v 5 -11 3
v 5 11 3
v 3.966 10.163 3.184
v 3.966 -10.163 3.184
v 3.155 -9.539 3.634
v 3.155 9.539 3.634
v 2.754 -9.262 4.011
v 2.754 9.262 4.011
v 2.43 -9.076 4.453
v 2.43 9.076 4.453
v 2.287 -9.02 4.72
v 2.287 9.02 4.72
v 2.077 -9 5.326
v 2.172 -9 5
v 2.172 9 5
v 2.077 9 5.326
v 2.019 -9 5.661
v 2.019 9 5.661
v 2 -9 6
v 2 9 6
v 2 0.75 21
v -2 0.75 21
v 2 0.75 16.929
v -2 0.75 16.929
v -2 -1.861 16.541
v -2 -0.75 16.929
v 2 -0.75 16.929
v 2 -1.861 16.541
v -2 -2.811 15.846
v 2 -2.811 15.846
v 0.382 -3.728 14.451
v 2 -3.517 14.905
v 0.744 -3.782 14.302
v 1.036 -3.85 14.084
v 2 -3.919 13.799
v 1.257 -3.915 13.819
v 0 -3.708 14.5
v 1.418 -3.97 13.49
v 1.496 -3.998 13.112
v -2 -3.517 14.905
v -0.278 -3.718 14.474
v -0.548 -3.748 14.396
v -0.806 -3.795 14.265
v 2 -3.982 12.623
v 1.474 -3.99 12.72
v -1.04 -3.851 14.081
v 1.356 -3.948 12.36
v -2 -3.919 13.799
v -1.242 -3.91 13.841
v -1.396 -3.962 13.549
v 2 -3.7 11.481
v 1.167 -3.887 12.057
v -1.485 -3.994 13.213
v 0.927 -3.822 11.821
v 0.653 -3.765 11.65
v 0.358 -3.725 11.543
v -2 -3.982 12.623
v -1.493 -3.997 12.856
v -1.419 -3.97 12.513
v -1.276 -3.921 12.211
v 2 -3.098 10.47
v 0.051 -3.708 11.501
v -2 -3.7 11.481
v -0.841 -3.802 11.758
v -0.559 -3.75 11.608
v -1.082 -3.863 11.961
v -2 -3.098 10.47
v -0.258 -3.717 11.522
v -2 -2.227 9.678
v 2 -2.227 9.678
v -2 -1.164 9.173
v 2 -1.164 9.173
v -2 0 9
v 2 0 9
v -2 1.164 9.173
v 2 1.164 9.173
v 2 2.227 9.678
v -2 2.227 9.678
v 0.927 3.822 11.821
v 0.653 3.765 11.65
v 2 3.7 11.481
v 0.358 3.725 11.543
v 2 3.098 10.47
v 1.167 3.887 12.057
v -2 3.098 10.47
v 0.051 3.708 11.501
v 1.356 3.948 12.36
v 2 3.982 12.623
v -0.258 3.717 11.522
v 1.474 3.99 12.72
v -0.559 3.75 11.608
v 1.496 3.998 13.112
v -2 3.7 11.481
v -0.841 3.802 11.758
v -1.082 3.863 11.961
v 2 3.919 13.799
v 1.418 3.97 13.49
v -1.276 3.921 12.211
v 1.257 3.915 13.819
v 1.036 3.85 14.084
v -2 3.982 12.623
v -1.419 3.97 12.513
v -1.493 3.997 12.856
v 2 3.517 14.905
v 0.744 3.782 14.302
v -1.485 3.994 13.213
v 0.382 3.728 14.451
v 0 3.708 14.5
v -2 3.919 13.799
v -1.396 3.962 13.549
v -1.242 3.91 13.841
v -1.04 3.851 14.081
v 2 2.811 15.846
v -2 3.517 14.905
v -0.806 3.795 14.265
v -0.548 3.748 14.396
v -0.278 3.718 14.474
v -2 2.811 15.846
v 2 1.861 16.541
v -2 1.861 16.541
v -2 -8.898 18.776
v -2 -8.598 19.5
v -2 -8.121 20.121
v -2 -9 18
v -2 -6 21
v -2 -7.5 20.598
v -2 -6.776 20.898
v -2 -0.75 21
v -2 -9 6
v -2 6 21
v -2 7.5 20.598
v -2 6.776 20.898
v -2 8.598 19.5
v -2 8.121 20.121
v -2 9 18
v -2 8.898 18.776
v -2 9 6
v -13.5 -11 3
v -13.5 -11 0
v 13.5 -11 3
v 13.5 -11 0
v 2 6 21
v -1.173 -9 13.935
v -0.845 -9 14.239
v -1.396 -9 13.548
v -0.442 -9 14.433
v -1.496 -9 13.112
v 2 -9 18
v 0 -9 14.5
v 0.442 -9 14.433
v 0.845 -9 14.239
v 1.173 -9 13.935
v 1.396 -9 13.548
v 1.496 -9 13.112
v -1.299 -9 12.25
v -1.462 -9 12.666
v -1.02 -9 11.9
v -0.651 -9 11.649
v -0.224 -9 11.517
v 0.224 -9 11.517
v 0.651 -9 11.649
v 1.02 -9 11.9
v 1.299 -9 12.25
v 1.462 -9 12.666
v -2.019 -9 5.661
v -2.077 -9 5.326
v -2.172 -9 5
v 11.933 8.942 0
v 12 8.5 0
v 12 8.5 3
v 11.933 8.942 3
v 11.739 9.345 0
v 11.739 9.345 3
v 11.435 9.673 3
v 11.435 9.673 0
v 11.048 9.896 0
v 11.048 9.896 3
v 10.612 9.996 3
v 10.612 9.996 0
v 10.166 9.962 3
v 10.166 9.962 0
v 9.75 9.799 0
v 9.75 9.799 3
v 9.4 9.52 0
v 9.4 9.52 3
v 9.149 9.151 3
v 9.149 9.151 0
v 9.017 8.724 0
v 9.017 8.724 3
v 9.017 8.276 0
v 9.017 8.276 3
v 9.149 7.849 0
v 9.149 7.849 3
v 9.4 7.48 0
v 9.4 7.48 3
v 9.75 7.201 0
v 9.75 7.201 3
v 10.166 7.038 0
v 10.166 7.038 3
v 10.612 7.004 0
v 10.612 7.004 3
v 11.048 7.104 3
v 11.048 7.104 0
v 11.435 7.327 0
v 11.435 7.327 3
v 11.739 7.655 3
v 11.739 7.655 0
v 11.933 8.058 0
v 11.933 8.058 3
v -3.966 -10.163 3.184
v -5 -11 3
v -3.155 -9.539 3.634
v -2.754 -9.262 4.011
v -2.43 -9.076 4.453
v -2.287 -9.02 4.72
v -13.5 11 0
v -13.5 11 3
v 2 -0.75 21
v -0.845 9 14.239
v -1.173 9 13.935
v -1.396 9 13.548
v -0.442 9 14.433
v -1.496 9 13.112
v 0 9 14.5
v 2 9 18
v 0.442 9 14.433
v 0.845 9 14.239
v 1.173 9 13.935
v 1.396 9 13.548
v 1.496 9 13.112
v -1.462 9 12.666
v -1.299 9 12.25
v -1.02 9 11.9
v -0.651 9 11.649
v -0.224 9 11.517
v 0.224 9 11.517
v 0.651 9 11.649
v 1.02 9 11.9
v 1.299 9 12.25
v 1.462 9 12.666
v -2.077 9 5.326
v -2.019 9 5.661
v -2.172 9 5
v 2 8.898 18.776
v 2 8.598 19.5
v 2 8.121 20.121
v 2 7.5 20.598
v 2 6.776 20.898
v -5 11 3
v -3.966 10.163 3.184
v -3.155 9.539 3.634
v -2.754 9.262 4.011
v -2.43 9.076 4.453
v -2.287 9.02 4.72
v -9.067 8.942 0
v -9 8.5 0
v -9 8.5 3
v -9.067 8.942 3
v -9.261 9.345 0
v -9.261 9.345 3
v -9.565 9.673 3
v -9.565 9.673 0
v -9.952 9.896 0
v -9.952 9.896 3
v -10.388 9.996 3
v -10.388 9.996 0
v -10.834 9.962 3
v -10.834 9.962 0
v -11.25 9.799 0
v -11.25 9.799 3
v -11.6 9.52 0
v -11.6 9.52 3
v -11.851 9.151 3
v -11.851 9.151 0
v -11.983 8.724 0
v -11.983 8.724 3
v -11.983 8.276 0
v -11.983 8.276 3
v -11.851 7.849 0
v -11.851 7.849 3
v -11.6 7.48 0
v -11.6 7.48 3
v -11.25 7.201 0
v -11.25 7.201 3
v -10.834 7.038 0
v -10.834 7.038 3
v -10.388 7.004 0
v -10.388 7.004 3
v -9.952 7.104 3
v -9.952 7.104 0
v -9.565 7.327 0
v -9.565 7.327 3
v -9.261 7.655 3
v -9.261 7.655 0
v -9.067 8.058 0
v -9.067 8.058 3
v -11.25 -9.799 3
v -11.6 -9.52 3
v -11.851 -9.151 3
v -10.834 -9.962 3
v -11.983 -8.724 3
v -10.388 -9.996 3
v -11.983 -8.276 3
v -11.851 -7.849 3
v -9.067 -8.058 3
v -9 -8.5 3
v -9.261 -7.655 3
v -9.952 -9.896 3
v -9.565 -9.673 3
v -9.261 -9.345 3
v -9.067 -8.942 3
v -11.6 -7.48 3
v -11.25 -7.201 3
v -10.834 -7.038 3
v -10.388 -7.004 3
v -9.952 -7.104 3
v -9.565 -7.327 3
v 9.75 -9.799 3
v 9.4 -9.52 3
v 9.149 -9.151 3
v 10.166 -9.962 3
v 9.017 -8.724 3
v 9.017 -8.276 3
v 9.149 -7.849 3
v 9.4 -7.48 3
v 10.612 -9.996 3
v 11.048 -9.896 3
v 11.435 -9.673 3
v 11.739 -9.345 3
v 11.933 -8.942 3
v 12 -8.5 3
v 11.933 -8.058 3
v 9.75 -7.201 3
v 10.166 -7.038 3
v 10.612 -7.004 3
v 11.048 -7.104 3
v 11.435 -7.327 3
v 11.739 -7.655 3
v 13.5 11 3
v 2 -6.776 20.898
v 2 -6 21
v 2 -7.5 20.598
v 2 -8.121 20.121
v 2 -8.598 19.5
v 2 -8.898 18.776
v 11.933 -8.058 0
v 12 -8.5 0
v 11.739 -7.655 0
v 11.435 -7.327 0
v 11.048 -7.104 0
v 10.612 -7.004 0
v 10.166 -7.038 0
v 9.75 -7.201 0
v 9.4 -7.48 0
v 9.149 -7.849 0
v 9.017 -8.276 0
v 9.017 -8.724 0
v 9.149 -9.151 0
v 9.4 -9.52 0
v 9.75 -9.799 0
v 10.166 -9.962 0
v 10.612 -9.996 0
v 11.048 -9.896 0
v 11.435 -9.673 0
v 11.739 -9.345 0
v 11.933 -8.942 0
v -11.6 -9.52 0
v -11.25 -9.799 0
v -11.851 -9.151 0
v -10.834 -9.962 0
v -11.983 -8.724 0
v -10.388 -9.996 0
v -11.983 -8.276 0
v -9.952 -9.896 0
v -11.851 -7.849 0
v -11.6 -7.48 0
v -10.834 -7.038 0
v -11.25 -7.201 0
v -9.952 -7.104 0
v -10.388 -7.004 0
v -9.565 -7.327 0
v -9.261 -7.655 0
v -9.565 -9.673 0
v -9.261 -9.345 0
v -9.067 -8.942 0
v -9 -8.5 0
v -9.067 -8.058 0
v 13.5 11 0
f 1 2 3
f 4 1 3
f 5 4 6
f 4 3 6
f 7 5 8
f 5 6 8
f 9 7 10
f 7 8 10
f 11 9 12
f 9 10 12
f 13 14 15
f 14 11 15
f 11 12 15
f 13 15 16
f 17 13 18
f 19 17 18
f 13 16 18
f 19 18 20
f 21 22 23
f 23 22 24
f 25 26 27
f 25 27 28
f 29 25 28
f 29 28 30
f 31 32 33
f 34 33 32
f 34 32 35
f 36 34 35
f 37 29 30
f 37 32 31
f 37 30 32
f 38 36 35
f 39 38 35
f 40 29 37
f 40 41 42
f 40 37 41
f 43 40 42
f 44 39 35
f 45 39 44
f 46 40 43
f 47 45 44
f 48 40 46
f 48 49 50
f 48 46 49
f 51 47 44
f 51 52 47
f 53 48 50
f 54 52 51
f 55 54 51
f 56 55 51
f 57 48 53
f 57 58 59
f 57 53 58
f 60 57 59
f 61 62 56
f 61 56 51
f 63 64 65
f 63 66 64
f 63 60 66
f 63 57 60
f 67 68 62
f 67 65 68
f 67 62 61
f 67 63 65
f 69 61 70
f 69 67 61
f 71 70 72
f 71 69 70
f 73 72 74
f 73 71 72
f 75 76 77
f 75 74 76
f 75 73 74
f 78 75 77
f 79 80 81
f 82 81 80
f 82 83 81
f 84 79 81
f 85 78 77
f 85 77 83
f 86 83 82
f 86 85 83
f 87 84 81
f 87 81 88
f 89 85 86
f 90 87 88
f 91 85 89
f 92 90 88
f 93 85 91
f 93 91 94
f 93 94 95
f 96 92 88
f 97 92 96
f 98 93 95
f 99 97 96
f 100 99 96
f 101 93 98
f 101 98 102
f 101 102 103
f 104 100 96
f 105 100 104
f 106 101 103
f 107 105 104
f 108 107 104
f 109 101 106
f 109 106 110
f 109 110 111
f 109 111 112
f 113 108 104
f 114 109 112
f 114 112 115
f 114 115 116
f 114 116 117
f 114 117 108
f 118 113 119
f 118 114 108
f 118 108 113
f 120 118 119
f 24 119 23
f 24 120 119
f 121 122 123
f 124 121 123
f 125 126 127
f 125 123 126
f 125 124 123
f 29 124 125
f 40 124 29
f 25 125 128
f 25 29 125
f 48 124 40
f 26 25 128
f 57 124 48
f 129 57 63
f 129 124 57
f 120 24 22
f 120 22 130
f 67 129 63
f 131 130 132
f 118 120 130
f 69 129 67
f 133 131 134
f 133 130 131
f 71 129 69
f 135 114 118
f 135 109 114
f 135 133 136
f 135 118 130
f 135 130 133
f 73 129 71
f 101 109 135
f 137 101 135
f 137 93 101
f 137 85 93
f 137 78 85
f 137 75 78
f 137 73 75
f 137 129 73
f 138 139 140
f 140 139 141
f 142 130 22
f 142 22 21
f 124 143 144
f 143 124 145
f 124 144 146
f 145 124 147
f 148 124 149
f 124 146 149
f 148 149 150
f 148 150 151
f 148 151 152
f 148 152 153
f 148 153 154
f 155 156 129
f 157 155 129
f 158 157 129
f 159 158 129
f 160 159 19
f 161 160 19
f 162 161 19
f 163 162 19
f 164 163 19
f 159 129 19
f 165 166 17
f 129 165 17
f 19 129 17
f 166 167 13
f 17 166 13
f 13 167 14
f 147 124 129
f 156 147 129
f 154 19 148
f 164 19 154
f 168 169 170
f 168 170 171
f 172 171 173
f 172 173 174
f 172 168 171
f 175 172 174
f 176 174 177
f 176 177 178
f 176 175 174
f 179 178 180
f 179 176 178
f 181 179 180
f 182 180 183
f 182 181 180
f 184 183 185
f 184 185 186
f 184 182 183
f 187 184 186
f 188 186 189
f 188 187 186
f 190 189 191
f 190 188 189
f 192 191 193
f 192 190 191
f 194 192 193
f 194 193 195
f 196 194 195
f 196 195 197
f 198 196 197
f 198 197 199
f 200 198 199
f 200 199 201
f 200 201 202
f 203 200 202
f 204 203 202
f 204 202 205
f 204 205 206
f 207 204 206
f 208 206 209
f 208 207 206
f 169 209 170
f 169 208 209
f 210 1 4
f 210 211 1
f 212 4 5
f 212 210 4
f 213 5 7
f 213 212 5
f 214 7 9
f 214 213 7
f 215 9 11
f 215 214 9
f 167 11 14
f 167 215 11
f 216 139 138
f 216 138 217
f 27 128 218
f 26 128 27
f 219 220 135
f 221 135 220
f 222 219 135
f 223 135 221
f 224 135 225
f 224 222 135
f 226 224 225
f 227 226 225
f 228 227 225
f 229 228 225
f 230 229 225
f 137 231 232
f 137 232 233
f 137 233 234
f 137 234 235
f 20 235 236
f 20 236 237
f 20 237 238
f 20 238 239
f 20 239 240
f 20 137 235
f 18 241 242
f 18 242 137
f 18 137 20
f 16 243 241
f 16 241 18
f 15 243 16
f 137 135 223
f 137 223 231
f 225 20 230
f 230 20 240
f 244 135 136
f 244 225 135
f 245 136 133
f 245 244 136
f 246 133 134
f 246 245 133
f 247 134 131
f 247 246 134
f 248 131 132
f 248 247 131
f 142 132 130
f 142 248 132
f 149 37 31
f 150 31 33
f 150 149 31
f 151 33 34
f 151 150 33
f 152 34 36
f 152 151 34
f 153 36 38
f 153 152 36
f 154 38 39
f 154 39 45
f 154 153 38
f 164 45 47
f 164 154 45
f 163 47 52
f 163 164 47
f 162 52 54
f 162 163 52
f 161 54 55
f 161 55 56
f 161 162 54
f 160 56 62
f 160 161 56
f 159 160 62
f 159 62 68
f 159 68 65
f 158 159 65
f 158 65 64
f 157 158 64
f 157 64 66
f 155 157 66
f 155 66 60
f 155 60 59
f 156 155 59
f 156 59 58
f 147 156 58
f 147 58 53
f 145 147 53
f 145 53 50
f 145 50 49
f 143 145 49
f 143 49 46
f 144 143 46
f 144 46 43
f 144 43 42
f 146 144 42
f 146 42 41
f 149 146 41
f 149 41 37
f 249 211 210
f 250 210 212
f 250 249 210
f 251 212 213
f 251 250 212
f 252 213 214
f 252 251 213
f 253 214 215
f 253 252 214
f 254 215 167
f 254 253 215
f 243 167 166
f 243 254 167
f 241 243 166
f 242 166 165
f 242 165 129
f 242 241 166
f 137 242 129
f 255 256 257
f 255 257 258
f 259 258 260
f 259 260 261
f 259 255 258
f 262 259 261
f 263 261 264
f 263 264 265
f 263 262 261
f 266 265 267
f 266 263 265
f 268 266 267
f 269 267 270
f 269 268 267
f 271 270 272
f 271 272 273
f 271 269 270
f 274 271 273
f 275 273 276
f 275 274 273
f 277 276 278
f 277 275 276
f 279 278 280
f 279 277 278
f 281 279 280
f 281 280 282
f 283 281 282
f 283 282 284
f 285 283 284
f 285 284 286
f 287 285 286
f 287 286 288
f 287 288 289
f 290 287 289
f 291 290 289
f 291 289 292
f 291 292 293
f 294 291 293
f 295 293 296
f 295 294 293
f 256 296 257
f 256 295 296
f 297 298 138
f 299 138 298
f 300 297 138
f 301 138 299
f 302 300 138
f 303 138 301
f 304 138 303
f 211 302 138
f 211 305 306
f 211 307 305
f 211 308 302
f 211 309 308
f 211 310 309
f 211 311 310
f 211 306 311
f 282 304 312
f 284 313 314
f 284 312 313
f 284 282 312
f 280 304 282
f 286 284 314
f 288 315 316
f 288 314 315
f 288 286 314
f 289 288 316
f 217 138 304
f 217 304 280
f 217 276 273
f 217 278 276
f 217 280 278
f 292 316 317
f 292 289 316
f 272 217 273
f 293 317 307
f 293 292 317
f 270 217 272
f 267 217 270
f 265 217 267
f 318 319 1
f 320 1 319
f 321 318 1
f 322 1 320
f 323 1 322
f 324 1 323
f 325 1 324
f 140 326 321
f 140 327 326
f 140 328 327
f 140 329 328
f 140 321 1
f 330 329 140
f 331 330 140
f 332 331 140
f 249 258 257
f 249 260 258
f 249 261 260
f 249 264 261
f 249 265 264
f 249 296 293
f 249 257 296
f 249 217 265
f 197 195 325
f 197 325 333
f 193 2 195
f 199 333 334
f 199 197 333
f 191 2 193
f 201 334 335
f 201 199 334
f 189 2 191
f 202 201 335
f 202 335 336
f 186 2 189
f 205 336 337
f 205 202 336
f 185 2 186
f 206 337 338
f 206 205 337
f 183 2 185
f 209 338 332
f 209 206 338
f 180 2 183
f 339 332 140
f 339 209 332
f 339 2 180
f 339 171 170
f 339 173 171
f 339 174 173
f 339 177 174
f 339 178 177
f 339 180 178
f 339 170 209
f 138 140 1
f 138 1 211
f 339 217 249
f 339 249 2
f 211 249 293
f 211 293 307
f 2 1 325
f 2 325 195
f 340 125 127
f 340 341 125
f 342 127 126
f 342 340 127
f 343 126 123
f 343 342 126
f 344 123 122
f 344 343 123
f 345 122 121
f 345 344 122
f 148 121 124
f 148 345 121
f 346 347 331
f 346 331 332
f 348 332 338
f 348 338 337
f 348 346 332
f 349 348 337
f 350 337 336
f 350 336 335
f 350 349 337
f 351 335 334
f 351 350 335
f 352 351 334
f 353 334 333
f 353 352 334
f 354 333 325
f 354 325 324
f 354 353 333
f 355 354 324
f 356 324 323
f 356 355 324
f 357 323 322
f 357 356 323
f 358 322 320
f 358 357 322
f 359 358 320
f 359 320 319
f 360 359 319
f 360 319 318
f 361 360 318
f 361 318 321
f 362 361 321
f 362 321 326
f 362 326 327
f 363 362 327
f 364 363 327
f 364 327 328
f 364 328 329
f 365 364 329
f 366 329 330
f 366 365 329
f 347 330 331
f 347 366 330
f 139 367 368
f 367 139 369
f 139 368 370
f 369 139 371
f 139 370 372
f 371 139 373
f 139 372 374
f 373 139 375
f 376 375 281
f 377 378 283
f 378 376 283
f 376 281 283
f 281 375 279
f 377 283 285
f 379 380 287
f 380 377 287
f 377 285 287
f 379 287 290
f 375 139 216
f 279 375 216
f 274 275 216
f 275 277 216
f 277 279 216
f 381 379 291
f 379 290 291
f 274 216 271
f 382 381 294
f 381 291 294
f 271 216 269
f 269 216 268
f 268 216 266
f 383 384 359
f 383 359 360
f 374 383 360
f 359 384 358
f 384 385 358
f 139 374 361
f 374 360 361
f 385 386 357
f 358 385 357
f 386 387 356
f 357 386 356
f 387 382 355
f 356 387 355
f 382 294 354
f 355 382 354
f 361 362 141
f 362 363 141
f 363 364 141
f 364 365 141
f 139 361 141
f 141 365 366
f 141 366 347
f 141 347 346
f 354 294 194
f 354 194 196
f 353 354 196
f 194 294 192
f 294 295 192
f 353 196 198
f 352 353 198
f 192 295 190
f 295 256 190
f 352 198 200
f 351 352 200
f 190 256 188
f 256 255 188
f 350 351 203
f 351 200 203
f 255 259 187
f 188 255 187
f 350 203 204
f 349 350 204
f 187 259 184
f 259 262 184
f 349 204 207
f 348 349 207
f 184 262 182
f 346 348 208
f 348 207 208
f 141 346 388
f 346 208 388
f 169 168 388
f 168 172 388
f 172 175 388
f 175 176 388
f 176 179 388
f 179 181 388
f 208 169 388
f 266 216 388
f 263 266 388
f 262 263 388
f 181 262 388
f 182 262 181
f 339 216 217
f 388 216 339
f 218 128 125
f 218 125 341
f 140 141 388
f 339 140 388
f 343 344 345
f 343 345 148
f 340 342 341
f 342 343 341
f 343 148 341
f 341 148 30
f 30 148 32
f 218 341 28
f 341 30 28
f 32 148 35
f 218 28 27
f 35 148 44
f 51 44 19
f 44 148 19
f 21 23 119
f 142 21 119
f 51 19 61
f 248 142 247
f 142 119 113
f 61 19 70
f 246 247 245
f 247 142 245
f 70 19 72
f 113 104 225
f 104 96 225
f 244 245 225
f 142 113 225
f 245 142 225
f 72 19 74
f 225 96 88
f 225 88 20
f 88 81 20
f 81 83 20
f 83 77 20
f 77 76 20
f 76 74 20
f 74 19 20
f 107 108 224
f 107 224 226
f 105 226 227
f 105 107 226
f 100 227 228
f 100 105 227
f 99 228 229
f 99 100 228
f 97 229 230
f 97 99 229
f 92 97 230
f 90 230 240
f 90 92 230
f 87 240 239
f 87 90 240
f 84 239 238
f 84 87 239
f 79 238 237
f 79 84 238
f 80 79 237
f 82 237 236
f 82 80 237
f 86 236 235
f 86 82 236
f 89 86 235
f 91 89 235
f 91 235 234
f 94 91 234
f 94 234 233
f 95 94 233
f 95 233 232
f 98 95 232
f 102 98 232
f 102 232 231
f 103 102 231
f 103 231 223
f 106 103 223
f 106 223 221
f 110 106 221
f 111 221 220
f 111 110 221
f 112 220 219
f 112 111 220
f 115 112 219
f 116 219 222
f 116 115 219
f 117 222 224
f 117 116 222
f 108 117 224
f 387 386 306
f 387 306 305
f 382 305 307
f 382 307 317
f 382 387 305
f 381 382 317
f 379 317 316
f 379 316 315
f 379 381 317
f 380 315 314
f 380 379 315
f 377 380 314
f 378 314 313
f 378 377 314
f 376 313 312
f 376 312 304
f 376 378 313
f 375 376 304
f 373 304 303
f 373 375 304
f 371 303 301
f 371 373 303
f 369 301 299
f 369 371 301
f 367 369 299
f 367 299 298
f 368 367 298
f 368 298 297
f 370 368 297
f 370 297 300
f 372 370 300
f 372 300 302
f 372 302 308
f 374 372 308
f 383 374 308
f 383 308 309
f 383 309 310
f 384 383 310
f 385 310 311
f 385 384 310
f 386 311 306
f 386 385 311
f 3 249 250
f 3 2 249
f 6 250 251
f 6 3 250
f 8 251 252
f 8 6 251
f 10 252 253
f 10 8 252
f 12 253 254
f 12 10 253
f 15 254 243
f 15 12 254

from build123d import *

# Parameters (mm, degrees)
SKETCH1_W               = 27
SKETCH1_H               = 22
SKETCH1_R               = 1.5
BOSS_EXTRUDE1_DEPTH     = 3
SKETCH2_W               = 4
SKETCH2_H               = 18
BOSS_EXTRUDE2_DEPTH     = 18
CUT_EXTRUDE1_DEPTH      = 29.324018077
CUT_EXTRUDE1_DEPTH_BACK = 29.324018077
SKETCH3_R               = 4
CUT_EXTRUDE2_DEPTH      = 29.324018077
CUT_EXTRUDE2_DEPTH_BACK = 29.324018077
SKETCH4_W               = 8.09758535
SKETCH4_H               = 1.5
FILLET1_R               = 3
CUT_EXTRUDE3_DEPTH      = 34.275366264
CUT_EXTRUDE3_DEPTH_BACK = 34.275366264
SKETCH5_R               = 1.5
FILLET2_R               = 2
FILLET3_R               = 3


with BuildPart() as part:
    # Sketch1 → Boss-Extrude1 (new body)
    with BuildSketch(Plane.XY):
        Rectangle(SKETCH1_W, SKETCH1_H)
        with Locations((-10.5, -8.5)):
            Circle(SKETCH1_R, mode=Mode.SUBTRACT)
        with Locations((-10.5, 8.5)):
            Circle(SKETCH1_R, mode=Mode.SUBTRACT)
        with Locations((10.5, 8.5)):
            Circle(SKETCH1_R, mode=Mode.SUBTRACT)
        with Locations((10.5, -8.5)):
            Circle(SKETCH1_R, mode=Mode.SUBTRACT)
    extrude(amount=BOSS_EXTRUDE1_DEPTH)

    # Sketch2 → Boss-Extrude2 (add)
    with BuildSketch(Plane.XY.offset(3)):
        Rectangle(SKETCH2_W, SKETCH2_H)
    extrude(amount=BOSS_EXTRUDE2_DEPTH)

    # Sketch3 → Cut-Extrude1 (cut, two sides: drawn at the far end of the back side and taken through both)
    with BuildSketch(Plane(origin=(2, 0, 0), x_dir=(0, 0, -1), z_dir=(1, 0, 0)).offset(-CUT_EXTRUDE1_DEPTH_BACK)):
        with Locations(Location((-13, 0, 0), (0, 0, 180))):
            Circle(SKETCH3_R)
    extrude(amount=CUT_EXTRUDE1_DEPTH + CUT_EXTRUDE1_DEPTH_BACK, mode=Mode.SUBTRACT)

    # Sketch4 → Cut-Extrude2 (cut, two sides: drawn at the far end of the back side and taken through both)
    with BuildSketch(Plane(origin=(2, 0, 0), x_dir=(0, 0, -1), z_dir=(1, 0, 0)).offset(-CUT_EXTRUDE2_DEPTH_BACK)):
        with Locations((-18.330812417, 0)):
            Rectangle(SKETCH4_W, SKETCH4_H)
    extrude(amount=CUT_EXTRUDE2_DEPTH + CUT_EXTRUDE2_DEPTH_BACK, mode=Mode.SUBTRACT)

    # Fillet1
    fillet1_edges = [part.edges().sort_by_distance(p)[0] for p in [
        (-2, 0, 3),
        (2, 0, 3),
    ]]
    fillet(fillet1_edges, radius=FILLET1_R)

    # Sketch5 → Cut-Extrude3 (cut, two sides: drawn at the far end of the back side and taken through both)
    with BuildSketch(Plane(origin=(0, 11, 0), x_dir=(1, 0, 0), z_dir=(0, 1, 0)).offset(-CUT_EXTRUDE3_DEPTH_BACK)):
        with Locations(Location((0, -13, 0), (0, 0, 270))):
            Circle(SKETCH5_R)
    extrude(amount=CUT_EXTRUDE3_DEPTH + CUT_EXTRUDE3_DEPTH_BACK, mode=Mode.SUBTRACT)

    # Fillet2
    fillet2_edges = [part.edges().sort_by_distance(p)[0] for p in [
        (0, -9, 3),
        (0, 9, 3),
    ]]
    fillet(fillet2_edges, radius=FILLET2_R - 0.0001)  # a hair under: the kernel refuses the full size

    # Fillet3
    fillet3_edges = [part.edges().sort_by_distance(p)[0] for p in [
        (0, -9, 21),
        (0, 9, 21),
    ]]
    fillet(fillet3_edges, radius=FILLET3_R)


solid = part.part
